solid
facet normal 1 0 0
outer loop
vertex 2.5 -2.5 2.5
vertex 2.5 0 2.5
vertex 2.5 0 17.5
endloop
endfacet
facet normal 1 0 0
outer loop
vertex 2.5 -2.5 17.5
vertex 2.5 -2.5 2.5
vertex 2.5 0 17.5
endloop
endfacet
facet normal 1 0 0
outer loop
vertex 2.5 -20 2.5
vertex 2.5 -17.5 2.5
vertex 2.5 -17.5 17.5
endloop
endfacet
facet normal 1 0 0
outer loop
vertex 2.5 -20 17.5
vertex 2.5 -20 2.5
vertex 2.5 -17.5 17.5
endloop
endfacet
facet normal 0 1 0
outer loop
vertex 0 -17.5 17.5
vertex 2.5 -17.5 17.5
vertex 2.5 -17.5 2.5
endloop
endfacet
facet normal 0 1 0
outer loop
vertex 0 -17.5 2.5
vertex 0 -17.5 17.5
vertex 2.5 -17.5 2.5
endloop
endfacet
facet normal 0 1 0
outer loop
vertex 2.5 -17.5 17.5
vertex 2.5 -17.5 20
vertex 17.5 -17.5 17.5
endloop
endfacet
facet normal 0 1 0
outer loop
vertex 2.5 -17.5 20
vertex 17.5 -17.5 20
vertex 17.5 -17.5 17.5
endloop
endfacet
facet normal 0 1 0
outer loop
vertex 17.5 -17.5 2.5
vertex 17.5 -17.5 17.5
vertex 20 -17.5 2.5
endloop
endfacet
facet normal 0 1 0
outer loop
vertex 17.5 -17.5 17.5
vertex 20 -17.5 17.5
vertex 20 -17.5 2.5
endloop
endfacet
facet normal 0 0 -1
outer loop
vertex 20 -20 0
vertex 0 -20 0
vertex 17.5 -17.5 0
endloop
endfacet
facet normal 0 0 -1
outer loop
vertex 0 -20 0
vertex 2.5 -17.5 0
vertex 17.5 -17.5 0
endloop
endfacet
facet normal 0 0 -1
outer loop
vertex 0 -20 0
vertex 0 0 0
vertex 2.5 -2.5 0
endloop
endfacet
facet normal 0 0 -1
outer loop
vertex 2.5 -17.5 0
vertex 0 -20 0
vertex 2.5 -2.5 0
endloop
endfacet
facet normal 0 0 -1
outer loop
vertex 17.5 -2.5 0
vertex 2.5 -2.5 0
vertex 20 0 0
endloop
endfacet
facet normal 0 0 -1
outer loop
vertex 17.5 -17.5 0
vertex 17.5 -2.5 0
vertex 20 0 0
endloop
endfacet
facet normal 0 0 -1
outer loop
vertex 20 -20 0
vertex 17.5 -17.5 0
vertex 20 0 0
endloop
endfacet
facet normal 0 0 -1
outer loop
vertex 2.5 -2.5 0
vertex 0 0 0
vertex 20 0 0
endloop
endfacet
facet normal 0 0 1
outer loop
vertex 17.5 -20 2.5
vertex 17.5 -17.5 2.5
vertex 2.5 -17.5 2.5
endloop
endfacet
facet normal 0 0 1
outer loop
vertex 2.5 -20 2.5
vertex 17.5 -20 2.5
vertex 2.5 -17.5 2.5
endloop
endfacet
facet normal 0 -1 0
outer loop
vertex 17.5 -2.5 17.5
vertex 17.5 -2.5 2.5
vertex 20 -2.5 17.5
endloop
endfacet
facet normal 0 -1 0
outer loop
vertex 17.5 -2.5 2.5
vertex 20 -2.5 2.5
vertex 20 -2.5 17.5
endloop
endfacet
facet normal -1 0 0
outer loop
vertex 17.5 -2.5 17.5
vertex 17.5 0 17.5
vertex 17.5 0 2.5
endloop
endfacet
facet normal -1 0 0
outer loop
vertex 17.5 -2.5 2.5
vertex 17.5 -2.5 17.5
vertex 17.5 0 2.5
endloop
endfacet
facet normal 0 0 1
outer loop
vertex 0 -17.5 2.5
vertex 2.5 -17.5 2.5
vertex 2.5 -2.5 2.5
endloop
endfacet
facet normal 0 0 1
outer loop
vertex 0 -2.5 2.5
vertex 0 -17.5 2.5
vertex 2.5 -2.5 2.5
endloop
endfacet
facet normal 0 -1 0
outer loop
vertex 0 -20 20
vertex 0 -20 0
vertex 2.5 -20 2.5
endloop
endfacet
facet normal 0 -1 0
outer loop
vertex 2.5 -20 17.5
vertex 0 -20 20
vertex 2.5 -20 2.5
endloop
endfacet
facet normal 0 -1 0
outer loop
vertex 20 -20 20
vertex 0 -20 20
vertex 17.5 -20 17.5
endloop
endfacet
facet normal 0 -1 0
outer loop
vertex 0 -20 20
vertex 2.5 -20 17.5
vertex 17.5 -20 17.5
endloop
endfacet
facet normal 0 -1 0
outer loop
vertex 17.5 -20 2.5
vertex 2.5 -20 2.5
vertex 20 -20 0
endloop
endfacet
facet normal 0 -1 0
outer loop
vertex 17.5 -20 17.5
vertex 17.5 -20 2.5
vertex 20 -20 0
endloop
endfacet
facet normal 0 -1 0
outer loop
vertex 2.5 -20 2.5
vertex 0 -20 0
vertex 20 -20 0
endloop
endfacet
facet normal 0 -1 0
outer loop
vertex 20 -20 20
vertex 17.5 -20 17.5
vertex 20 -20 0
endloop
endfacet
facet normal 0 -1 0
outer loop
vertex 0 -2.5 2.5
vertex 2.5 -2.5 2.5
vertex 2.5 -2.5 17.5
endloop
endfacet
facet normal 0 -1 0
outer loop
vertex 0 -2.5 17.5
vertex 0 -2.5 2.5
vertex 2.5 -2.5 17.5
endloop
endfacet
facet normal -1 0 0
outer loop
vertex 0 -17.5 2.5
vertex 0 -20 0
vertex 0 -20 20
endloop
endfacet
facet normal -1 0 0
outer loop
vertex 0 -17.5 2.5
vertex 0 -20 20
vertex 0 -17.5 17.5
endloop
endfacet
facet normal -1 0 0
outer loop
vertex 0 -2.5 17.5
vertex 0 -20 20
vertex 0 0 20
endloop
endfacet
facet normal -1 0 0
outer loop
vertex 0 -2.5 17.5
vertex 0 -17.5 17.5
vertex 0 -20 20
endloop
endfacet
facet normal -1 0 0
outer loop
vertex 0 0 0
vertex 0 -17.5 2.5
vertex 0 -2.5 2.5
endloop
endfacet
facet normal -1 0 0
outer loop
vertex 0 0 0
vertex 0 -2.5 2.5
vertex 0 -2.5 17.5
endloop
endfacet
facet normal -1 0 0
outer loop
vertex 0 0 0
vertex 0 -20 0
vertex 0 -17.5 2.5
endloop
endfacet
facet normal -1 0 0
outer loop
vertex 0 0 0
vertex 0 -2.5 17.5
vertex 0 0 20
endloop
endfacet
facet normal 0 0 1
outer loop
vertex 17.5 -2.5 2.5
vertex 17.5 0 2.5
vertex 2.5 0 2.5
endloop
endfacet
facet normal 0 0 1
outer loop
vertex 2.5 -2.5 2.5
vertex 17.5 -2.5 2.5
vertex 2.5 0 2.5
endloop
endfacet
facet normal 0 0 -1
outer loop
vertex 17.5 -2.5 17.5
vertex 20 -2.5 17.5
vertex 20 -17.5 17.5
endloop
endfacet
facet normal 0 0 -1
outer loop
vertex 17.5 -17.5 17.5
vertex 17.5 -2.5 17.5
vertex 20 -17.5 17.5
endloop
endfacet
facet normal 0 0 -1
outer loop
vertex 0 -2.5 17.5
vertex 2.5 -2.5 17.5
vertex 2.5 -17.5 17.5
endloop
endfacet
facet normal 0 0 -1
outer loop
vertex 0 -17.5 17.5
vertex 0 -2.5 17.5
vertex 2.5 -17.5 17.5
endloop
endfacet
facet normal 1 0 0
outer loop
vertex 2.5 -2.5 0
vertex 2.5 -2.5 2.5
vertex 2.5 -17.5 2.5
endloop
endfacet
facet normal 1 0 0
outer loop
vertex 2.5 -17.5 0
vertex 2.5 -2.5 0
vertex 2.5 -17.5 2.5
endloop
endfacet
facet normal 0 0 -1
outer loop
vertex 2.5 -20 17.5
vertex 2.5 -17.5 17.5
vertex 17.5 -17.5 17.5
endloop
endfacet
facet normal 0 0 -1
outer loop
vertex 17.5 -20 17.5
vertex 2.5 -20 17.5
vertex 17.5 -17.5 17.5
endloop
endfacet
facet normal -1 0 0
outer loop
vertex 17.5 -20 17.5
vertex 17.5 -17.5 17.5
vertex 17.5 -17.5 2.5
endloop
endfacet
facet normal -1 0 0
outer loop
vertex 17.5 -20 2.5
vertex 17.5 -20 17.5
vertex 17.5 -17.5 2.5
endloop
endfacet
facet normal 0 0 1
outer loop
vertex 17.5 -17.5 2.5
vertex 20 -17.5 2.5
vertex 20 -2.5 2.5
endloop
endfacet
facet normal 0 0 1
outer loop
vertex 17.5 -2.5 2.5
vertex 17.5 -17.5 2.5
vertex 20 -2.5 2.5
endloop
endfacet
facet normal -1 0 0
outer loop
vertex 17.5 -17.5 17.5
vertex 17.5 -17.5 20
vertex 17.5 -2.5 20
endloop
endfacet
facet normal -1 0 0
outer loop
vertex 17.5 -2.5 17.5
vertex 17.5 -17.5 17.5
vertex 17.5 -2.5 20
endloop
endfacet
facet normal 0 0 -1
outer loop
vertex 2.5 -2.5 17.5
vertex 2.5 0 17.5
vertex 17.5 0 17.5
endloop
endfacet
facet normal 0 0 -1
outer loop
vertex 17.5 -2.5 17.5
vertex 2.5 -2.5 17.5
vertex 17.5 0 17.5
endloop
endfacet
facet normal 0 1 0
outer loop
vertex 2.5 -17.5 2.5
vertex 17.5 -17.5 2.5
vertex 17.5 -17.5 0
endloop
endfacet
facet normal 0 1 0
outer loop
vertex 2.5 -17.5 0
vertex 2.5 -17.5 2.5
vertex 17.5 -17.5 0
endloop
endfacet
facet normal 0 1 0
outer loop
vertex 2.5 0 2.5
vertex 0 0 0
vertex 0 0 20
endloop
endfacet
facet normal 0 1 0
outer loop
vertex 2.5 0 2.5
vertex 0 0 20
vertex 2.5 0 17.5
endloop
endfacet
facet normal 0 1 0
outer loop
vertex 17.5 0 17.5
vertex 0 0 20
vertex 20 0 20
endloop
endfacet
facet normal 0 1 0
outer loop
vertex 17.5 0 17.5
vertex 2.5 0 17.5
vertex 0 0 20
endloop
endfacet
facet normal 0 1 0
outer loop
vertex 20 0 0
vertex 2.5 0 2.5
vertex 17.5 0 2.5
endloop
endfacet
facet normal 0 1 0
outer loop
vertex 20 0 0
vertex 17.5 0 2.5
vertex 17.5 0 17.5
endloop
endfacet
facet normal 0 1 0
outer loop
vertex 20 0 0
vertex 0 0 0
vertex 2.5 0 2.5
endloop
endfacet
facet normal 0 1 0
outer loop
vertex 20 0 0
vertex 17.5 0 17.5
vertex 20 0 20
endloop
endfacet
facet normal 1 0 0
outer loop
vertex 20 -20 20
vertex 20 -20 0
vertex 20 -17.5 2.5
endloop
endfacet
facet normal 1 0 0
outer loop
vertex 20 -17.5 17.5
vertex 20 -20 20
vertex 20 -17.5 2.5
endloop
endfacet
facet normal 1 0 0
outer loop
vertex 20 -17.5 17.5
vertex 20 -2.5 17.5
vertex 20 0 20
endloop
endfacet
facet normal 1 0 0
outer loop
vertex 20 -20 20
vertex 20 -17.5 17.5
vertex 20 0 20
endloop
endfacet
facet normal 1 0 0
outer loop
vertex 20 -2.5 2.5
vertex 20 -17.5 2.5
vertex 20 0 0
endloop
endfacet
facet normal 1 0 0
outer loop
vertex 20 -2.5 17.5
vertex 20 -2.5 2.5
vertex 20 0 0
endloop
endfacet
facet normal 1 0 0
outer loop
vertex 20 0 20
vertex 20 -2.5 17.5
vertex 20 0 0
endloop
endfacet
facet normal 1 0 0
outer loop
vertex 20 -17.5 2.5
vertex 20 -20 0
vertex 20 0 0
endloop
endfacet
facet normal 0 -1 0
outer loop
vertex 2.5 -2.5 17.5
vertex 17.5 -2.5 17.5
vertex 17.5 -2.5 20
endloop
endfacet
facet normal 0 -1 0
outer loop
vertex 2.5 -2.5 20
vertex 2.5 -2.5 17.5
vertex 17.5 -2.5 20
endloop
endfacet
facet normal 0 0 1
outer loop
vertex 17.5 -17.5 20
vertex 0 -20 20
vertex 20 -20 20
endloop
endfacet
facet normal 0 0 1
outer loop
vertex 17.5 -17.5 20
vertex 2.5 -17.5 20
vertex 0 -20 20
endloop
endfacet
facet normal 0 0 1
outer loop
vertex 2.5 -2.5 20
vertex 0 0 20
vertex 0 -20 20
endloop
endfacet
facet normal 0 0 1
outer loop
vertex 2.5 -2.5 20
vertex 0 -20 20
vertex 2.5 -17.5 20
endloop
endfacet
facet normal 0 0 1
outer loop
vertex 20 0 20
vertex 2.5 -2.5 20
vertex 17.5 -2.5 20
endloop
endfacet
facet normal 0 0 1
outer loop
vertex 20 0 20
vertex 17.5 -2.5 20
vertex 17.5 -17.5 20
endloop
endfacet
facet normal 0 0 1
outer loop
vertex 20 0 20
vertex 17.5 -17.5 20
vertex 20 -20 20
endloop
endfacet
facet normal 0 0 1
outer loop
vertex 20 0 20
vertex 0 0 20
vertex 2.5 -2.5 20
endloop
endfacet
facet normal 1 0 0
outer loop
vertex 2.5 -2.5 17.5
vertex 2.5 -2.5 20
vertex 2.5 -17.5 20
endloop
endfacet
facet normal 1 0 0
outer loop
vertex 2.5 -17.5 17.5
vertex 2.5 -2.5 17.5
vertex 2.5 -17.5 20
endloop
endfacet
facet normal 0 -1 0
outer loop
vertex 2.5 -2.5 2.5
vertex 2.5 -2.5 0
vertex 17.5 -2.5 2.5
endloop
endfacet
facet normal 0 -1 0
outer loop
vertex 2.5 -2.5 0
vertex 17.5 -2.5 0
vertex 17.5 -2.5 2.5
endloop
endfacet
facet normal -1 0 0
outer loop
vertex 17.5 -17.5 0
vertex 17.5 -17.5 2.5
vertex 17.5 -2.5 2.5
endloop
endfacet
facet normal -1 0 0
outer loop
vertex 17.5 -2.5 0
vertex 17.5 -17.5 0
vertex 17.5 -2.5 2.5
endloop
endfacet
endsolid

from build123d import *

# Parameters (mm, degrees)
F0_W     = 20
F0_H     = 20
F1_DEPTH = 20
F2_W     = 7.5
F2_H     = 7.5
F3_DEPTH = 25
F4_W     = 7.5
F4_H     = 7.5
F5_DEPTH = 25
F6_W     = 7.5
F6_H     = 7.5
F7_DEPTH = 25


with BuildPart() as f1:
    # F0 (on Top) → F1 (new body)
    with BuildSketch(Plane.XY):
        with Locations((10, -10)):
            Rectangle(F0_W, F0_H)
    extrude(amount=F1_DEPTH)

    # F2 (on face) → F3 (cut)
    with BuildSketch(Plane.YZ.offset(20)):
        with Locations((-6.25, 13.75)):
            Rectangle(F2_W, F2_H)
        with Locations((-6.25, 6.25)):
            Rectangle(F2_W, F2_H)
        with Locations((-13.75, 6.25)):
            Rectangle(F2_W, F2_H)
        with Locations((-13.75, 13.75)):
            Rectangle(F2_W, F2_H)
    extrude(amount=-F3_DEPTH, mode=Mode.SUBTRACT)

    # F4 (on face) → F5 (cut)
    with BuildSketch(Plane.XY.offset(20)):
        with Locations((13.75, -6.25)):
            Rectangle(F4_W, F4_H)
        with Locations((6.25, -13.75)):
            Rectangle(F4_W, F4_H)
        with Locations((13.75, -13.75)):
            Rectangle(F4_W, F4_H)
        with Locations((6.25, -6.25)):
            Rectangle(F4_W, F4_H)
    extrude(amount=-F5_DEPTH, mode=Mode.SUBTRACT)

    # F6 (on face) → F7 (cut)
    with BuildSketch(Plane(origin=(0, 0, 0), x_dir=(-1, 0, 0), z_dir=(0, 1, 0))):
        with Locations((-13.75, 6.25)):
            Rectangle(F6_W, F6_H)
        with Locations((-6.25, 6.25)):
            Rectangle(F6_W, F6_H)
        with Locations((-13.75, 13.75)):
            Rectangle(F6_W, F6_H)
        with Locations((-6.25, 13.75)):
            Rectangle(F6_W, F6_H)
    extrude(amount=-F7_DEPTH, mode=Mode.SUBTRACT)


solid = f1.part
